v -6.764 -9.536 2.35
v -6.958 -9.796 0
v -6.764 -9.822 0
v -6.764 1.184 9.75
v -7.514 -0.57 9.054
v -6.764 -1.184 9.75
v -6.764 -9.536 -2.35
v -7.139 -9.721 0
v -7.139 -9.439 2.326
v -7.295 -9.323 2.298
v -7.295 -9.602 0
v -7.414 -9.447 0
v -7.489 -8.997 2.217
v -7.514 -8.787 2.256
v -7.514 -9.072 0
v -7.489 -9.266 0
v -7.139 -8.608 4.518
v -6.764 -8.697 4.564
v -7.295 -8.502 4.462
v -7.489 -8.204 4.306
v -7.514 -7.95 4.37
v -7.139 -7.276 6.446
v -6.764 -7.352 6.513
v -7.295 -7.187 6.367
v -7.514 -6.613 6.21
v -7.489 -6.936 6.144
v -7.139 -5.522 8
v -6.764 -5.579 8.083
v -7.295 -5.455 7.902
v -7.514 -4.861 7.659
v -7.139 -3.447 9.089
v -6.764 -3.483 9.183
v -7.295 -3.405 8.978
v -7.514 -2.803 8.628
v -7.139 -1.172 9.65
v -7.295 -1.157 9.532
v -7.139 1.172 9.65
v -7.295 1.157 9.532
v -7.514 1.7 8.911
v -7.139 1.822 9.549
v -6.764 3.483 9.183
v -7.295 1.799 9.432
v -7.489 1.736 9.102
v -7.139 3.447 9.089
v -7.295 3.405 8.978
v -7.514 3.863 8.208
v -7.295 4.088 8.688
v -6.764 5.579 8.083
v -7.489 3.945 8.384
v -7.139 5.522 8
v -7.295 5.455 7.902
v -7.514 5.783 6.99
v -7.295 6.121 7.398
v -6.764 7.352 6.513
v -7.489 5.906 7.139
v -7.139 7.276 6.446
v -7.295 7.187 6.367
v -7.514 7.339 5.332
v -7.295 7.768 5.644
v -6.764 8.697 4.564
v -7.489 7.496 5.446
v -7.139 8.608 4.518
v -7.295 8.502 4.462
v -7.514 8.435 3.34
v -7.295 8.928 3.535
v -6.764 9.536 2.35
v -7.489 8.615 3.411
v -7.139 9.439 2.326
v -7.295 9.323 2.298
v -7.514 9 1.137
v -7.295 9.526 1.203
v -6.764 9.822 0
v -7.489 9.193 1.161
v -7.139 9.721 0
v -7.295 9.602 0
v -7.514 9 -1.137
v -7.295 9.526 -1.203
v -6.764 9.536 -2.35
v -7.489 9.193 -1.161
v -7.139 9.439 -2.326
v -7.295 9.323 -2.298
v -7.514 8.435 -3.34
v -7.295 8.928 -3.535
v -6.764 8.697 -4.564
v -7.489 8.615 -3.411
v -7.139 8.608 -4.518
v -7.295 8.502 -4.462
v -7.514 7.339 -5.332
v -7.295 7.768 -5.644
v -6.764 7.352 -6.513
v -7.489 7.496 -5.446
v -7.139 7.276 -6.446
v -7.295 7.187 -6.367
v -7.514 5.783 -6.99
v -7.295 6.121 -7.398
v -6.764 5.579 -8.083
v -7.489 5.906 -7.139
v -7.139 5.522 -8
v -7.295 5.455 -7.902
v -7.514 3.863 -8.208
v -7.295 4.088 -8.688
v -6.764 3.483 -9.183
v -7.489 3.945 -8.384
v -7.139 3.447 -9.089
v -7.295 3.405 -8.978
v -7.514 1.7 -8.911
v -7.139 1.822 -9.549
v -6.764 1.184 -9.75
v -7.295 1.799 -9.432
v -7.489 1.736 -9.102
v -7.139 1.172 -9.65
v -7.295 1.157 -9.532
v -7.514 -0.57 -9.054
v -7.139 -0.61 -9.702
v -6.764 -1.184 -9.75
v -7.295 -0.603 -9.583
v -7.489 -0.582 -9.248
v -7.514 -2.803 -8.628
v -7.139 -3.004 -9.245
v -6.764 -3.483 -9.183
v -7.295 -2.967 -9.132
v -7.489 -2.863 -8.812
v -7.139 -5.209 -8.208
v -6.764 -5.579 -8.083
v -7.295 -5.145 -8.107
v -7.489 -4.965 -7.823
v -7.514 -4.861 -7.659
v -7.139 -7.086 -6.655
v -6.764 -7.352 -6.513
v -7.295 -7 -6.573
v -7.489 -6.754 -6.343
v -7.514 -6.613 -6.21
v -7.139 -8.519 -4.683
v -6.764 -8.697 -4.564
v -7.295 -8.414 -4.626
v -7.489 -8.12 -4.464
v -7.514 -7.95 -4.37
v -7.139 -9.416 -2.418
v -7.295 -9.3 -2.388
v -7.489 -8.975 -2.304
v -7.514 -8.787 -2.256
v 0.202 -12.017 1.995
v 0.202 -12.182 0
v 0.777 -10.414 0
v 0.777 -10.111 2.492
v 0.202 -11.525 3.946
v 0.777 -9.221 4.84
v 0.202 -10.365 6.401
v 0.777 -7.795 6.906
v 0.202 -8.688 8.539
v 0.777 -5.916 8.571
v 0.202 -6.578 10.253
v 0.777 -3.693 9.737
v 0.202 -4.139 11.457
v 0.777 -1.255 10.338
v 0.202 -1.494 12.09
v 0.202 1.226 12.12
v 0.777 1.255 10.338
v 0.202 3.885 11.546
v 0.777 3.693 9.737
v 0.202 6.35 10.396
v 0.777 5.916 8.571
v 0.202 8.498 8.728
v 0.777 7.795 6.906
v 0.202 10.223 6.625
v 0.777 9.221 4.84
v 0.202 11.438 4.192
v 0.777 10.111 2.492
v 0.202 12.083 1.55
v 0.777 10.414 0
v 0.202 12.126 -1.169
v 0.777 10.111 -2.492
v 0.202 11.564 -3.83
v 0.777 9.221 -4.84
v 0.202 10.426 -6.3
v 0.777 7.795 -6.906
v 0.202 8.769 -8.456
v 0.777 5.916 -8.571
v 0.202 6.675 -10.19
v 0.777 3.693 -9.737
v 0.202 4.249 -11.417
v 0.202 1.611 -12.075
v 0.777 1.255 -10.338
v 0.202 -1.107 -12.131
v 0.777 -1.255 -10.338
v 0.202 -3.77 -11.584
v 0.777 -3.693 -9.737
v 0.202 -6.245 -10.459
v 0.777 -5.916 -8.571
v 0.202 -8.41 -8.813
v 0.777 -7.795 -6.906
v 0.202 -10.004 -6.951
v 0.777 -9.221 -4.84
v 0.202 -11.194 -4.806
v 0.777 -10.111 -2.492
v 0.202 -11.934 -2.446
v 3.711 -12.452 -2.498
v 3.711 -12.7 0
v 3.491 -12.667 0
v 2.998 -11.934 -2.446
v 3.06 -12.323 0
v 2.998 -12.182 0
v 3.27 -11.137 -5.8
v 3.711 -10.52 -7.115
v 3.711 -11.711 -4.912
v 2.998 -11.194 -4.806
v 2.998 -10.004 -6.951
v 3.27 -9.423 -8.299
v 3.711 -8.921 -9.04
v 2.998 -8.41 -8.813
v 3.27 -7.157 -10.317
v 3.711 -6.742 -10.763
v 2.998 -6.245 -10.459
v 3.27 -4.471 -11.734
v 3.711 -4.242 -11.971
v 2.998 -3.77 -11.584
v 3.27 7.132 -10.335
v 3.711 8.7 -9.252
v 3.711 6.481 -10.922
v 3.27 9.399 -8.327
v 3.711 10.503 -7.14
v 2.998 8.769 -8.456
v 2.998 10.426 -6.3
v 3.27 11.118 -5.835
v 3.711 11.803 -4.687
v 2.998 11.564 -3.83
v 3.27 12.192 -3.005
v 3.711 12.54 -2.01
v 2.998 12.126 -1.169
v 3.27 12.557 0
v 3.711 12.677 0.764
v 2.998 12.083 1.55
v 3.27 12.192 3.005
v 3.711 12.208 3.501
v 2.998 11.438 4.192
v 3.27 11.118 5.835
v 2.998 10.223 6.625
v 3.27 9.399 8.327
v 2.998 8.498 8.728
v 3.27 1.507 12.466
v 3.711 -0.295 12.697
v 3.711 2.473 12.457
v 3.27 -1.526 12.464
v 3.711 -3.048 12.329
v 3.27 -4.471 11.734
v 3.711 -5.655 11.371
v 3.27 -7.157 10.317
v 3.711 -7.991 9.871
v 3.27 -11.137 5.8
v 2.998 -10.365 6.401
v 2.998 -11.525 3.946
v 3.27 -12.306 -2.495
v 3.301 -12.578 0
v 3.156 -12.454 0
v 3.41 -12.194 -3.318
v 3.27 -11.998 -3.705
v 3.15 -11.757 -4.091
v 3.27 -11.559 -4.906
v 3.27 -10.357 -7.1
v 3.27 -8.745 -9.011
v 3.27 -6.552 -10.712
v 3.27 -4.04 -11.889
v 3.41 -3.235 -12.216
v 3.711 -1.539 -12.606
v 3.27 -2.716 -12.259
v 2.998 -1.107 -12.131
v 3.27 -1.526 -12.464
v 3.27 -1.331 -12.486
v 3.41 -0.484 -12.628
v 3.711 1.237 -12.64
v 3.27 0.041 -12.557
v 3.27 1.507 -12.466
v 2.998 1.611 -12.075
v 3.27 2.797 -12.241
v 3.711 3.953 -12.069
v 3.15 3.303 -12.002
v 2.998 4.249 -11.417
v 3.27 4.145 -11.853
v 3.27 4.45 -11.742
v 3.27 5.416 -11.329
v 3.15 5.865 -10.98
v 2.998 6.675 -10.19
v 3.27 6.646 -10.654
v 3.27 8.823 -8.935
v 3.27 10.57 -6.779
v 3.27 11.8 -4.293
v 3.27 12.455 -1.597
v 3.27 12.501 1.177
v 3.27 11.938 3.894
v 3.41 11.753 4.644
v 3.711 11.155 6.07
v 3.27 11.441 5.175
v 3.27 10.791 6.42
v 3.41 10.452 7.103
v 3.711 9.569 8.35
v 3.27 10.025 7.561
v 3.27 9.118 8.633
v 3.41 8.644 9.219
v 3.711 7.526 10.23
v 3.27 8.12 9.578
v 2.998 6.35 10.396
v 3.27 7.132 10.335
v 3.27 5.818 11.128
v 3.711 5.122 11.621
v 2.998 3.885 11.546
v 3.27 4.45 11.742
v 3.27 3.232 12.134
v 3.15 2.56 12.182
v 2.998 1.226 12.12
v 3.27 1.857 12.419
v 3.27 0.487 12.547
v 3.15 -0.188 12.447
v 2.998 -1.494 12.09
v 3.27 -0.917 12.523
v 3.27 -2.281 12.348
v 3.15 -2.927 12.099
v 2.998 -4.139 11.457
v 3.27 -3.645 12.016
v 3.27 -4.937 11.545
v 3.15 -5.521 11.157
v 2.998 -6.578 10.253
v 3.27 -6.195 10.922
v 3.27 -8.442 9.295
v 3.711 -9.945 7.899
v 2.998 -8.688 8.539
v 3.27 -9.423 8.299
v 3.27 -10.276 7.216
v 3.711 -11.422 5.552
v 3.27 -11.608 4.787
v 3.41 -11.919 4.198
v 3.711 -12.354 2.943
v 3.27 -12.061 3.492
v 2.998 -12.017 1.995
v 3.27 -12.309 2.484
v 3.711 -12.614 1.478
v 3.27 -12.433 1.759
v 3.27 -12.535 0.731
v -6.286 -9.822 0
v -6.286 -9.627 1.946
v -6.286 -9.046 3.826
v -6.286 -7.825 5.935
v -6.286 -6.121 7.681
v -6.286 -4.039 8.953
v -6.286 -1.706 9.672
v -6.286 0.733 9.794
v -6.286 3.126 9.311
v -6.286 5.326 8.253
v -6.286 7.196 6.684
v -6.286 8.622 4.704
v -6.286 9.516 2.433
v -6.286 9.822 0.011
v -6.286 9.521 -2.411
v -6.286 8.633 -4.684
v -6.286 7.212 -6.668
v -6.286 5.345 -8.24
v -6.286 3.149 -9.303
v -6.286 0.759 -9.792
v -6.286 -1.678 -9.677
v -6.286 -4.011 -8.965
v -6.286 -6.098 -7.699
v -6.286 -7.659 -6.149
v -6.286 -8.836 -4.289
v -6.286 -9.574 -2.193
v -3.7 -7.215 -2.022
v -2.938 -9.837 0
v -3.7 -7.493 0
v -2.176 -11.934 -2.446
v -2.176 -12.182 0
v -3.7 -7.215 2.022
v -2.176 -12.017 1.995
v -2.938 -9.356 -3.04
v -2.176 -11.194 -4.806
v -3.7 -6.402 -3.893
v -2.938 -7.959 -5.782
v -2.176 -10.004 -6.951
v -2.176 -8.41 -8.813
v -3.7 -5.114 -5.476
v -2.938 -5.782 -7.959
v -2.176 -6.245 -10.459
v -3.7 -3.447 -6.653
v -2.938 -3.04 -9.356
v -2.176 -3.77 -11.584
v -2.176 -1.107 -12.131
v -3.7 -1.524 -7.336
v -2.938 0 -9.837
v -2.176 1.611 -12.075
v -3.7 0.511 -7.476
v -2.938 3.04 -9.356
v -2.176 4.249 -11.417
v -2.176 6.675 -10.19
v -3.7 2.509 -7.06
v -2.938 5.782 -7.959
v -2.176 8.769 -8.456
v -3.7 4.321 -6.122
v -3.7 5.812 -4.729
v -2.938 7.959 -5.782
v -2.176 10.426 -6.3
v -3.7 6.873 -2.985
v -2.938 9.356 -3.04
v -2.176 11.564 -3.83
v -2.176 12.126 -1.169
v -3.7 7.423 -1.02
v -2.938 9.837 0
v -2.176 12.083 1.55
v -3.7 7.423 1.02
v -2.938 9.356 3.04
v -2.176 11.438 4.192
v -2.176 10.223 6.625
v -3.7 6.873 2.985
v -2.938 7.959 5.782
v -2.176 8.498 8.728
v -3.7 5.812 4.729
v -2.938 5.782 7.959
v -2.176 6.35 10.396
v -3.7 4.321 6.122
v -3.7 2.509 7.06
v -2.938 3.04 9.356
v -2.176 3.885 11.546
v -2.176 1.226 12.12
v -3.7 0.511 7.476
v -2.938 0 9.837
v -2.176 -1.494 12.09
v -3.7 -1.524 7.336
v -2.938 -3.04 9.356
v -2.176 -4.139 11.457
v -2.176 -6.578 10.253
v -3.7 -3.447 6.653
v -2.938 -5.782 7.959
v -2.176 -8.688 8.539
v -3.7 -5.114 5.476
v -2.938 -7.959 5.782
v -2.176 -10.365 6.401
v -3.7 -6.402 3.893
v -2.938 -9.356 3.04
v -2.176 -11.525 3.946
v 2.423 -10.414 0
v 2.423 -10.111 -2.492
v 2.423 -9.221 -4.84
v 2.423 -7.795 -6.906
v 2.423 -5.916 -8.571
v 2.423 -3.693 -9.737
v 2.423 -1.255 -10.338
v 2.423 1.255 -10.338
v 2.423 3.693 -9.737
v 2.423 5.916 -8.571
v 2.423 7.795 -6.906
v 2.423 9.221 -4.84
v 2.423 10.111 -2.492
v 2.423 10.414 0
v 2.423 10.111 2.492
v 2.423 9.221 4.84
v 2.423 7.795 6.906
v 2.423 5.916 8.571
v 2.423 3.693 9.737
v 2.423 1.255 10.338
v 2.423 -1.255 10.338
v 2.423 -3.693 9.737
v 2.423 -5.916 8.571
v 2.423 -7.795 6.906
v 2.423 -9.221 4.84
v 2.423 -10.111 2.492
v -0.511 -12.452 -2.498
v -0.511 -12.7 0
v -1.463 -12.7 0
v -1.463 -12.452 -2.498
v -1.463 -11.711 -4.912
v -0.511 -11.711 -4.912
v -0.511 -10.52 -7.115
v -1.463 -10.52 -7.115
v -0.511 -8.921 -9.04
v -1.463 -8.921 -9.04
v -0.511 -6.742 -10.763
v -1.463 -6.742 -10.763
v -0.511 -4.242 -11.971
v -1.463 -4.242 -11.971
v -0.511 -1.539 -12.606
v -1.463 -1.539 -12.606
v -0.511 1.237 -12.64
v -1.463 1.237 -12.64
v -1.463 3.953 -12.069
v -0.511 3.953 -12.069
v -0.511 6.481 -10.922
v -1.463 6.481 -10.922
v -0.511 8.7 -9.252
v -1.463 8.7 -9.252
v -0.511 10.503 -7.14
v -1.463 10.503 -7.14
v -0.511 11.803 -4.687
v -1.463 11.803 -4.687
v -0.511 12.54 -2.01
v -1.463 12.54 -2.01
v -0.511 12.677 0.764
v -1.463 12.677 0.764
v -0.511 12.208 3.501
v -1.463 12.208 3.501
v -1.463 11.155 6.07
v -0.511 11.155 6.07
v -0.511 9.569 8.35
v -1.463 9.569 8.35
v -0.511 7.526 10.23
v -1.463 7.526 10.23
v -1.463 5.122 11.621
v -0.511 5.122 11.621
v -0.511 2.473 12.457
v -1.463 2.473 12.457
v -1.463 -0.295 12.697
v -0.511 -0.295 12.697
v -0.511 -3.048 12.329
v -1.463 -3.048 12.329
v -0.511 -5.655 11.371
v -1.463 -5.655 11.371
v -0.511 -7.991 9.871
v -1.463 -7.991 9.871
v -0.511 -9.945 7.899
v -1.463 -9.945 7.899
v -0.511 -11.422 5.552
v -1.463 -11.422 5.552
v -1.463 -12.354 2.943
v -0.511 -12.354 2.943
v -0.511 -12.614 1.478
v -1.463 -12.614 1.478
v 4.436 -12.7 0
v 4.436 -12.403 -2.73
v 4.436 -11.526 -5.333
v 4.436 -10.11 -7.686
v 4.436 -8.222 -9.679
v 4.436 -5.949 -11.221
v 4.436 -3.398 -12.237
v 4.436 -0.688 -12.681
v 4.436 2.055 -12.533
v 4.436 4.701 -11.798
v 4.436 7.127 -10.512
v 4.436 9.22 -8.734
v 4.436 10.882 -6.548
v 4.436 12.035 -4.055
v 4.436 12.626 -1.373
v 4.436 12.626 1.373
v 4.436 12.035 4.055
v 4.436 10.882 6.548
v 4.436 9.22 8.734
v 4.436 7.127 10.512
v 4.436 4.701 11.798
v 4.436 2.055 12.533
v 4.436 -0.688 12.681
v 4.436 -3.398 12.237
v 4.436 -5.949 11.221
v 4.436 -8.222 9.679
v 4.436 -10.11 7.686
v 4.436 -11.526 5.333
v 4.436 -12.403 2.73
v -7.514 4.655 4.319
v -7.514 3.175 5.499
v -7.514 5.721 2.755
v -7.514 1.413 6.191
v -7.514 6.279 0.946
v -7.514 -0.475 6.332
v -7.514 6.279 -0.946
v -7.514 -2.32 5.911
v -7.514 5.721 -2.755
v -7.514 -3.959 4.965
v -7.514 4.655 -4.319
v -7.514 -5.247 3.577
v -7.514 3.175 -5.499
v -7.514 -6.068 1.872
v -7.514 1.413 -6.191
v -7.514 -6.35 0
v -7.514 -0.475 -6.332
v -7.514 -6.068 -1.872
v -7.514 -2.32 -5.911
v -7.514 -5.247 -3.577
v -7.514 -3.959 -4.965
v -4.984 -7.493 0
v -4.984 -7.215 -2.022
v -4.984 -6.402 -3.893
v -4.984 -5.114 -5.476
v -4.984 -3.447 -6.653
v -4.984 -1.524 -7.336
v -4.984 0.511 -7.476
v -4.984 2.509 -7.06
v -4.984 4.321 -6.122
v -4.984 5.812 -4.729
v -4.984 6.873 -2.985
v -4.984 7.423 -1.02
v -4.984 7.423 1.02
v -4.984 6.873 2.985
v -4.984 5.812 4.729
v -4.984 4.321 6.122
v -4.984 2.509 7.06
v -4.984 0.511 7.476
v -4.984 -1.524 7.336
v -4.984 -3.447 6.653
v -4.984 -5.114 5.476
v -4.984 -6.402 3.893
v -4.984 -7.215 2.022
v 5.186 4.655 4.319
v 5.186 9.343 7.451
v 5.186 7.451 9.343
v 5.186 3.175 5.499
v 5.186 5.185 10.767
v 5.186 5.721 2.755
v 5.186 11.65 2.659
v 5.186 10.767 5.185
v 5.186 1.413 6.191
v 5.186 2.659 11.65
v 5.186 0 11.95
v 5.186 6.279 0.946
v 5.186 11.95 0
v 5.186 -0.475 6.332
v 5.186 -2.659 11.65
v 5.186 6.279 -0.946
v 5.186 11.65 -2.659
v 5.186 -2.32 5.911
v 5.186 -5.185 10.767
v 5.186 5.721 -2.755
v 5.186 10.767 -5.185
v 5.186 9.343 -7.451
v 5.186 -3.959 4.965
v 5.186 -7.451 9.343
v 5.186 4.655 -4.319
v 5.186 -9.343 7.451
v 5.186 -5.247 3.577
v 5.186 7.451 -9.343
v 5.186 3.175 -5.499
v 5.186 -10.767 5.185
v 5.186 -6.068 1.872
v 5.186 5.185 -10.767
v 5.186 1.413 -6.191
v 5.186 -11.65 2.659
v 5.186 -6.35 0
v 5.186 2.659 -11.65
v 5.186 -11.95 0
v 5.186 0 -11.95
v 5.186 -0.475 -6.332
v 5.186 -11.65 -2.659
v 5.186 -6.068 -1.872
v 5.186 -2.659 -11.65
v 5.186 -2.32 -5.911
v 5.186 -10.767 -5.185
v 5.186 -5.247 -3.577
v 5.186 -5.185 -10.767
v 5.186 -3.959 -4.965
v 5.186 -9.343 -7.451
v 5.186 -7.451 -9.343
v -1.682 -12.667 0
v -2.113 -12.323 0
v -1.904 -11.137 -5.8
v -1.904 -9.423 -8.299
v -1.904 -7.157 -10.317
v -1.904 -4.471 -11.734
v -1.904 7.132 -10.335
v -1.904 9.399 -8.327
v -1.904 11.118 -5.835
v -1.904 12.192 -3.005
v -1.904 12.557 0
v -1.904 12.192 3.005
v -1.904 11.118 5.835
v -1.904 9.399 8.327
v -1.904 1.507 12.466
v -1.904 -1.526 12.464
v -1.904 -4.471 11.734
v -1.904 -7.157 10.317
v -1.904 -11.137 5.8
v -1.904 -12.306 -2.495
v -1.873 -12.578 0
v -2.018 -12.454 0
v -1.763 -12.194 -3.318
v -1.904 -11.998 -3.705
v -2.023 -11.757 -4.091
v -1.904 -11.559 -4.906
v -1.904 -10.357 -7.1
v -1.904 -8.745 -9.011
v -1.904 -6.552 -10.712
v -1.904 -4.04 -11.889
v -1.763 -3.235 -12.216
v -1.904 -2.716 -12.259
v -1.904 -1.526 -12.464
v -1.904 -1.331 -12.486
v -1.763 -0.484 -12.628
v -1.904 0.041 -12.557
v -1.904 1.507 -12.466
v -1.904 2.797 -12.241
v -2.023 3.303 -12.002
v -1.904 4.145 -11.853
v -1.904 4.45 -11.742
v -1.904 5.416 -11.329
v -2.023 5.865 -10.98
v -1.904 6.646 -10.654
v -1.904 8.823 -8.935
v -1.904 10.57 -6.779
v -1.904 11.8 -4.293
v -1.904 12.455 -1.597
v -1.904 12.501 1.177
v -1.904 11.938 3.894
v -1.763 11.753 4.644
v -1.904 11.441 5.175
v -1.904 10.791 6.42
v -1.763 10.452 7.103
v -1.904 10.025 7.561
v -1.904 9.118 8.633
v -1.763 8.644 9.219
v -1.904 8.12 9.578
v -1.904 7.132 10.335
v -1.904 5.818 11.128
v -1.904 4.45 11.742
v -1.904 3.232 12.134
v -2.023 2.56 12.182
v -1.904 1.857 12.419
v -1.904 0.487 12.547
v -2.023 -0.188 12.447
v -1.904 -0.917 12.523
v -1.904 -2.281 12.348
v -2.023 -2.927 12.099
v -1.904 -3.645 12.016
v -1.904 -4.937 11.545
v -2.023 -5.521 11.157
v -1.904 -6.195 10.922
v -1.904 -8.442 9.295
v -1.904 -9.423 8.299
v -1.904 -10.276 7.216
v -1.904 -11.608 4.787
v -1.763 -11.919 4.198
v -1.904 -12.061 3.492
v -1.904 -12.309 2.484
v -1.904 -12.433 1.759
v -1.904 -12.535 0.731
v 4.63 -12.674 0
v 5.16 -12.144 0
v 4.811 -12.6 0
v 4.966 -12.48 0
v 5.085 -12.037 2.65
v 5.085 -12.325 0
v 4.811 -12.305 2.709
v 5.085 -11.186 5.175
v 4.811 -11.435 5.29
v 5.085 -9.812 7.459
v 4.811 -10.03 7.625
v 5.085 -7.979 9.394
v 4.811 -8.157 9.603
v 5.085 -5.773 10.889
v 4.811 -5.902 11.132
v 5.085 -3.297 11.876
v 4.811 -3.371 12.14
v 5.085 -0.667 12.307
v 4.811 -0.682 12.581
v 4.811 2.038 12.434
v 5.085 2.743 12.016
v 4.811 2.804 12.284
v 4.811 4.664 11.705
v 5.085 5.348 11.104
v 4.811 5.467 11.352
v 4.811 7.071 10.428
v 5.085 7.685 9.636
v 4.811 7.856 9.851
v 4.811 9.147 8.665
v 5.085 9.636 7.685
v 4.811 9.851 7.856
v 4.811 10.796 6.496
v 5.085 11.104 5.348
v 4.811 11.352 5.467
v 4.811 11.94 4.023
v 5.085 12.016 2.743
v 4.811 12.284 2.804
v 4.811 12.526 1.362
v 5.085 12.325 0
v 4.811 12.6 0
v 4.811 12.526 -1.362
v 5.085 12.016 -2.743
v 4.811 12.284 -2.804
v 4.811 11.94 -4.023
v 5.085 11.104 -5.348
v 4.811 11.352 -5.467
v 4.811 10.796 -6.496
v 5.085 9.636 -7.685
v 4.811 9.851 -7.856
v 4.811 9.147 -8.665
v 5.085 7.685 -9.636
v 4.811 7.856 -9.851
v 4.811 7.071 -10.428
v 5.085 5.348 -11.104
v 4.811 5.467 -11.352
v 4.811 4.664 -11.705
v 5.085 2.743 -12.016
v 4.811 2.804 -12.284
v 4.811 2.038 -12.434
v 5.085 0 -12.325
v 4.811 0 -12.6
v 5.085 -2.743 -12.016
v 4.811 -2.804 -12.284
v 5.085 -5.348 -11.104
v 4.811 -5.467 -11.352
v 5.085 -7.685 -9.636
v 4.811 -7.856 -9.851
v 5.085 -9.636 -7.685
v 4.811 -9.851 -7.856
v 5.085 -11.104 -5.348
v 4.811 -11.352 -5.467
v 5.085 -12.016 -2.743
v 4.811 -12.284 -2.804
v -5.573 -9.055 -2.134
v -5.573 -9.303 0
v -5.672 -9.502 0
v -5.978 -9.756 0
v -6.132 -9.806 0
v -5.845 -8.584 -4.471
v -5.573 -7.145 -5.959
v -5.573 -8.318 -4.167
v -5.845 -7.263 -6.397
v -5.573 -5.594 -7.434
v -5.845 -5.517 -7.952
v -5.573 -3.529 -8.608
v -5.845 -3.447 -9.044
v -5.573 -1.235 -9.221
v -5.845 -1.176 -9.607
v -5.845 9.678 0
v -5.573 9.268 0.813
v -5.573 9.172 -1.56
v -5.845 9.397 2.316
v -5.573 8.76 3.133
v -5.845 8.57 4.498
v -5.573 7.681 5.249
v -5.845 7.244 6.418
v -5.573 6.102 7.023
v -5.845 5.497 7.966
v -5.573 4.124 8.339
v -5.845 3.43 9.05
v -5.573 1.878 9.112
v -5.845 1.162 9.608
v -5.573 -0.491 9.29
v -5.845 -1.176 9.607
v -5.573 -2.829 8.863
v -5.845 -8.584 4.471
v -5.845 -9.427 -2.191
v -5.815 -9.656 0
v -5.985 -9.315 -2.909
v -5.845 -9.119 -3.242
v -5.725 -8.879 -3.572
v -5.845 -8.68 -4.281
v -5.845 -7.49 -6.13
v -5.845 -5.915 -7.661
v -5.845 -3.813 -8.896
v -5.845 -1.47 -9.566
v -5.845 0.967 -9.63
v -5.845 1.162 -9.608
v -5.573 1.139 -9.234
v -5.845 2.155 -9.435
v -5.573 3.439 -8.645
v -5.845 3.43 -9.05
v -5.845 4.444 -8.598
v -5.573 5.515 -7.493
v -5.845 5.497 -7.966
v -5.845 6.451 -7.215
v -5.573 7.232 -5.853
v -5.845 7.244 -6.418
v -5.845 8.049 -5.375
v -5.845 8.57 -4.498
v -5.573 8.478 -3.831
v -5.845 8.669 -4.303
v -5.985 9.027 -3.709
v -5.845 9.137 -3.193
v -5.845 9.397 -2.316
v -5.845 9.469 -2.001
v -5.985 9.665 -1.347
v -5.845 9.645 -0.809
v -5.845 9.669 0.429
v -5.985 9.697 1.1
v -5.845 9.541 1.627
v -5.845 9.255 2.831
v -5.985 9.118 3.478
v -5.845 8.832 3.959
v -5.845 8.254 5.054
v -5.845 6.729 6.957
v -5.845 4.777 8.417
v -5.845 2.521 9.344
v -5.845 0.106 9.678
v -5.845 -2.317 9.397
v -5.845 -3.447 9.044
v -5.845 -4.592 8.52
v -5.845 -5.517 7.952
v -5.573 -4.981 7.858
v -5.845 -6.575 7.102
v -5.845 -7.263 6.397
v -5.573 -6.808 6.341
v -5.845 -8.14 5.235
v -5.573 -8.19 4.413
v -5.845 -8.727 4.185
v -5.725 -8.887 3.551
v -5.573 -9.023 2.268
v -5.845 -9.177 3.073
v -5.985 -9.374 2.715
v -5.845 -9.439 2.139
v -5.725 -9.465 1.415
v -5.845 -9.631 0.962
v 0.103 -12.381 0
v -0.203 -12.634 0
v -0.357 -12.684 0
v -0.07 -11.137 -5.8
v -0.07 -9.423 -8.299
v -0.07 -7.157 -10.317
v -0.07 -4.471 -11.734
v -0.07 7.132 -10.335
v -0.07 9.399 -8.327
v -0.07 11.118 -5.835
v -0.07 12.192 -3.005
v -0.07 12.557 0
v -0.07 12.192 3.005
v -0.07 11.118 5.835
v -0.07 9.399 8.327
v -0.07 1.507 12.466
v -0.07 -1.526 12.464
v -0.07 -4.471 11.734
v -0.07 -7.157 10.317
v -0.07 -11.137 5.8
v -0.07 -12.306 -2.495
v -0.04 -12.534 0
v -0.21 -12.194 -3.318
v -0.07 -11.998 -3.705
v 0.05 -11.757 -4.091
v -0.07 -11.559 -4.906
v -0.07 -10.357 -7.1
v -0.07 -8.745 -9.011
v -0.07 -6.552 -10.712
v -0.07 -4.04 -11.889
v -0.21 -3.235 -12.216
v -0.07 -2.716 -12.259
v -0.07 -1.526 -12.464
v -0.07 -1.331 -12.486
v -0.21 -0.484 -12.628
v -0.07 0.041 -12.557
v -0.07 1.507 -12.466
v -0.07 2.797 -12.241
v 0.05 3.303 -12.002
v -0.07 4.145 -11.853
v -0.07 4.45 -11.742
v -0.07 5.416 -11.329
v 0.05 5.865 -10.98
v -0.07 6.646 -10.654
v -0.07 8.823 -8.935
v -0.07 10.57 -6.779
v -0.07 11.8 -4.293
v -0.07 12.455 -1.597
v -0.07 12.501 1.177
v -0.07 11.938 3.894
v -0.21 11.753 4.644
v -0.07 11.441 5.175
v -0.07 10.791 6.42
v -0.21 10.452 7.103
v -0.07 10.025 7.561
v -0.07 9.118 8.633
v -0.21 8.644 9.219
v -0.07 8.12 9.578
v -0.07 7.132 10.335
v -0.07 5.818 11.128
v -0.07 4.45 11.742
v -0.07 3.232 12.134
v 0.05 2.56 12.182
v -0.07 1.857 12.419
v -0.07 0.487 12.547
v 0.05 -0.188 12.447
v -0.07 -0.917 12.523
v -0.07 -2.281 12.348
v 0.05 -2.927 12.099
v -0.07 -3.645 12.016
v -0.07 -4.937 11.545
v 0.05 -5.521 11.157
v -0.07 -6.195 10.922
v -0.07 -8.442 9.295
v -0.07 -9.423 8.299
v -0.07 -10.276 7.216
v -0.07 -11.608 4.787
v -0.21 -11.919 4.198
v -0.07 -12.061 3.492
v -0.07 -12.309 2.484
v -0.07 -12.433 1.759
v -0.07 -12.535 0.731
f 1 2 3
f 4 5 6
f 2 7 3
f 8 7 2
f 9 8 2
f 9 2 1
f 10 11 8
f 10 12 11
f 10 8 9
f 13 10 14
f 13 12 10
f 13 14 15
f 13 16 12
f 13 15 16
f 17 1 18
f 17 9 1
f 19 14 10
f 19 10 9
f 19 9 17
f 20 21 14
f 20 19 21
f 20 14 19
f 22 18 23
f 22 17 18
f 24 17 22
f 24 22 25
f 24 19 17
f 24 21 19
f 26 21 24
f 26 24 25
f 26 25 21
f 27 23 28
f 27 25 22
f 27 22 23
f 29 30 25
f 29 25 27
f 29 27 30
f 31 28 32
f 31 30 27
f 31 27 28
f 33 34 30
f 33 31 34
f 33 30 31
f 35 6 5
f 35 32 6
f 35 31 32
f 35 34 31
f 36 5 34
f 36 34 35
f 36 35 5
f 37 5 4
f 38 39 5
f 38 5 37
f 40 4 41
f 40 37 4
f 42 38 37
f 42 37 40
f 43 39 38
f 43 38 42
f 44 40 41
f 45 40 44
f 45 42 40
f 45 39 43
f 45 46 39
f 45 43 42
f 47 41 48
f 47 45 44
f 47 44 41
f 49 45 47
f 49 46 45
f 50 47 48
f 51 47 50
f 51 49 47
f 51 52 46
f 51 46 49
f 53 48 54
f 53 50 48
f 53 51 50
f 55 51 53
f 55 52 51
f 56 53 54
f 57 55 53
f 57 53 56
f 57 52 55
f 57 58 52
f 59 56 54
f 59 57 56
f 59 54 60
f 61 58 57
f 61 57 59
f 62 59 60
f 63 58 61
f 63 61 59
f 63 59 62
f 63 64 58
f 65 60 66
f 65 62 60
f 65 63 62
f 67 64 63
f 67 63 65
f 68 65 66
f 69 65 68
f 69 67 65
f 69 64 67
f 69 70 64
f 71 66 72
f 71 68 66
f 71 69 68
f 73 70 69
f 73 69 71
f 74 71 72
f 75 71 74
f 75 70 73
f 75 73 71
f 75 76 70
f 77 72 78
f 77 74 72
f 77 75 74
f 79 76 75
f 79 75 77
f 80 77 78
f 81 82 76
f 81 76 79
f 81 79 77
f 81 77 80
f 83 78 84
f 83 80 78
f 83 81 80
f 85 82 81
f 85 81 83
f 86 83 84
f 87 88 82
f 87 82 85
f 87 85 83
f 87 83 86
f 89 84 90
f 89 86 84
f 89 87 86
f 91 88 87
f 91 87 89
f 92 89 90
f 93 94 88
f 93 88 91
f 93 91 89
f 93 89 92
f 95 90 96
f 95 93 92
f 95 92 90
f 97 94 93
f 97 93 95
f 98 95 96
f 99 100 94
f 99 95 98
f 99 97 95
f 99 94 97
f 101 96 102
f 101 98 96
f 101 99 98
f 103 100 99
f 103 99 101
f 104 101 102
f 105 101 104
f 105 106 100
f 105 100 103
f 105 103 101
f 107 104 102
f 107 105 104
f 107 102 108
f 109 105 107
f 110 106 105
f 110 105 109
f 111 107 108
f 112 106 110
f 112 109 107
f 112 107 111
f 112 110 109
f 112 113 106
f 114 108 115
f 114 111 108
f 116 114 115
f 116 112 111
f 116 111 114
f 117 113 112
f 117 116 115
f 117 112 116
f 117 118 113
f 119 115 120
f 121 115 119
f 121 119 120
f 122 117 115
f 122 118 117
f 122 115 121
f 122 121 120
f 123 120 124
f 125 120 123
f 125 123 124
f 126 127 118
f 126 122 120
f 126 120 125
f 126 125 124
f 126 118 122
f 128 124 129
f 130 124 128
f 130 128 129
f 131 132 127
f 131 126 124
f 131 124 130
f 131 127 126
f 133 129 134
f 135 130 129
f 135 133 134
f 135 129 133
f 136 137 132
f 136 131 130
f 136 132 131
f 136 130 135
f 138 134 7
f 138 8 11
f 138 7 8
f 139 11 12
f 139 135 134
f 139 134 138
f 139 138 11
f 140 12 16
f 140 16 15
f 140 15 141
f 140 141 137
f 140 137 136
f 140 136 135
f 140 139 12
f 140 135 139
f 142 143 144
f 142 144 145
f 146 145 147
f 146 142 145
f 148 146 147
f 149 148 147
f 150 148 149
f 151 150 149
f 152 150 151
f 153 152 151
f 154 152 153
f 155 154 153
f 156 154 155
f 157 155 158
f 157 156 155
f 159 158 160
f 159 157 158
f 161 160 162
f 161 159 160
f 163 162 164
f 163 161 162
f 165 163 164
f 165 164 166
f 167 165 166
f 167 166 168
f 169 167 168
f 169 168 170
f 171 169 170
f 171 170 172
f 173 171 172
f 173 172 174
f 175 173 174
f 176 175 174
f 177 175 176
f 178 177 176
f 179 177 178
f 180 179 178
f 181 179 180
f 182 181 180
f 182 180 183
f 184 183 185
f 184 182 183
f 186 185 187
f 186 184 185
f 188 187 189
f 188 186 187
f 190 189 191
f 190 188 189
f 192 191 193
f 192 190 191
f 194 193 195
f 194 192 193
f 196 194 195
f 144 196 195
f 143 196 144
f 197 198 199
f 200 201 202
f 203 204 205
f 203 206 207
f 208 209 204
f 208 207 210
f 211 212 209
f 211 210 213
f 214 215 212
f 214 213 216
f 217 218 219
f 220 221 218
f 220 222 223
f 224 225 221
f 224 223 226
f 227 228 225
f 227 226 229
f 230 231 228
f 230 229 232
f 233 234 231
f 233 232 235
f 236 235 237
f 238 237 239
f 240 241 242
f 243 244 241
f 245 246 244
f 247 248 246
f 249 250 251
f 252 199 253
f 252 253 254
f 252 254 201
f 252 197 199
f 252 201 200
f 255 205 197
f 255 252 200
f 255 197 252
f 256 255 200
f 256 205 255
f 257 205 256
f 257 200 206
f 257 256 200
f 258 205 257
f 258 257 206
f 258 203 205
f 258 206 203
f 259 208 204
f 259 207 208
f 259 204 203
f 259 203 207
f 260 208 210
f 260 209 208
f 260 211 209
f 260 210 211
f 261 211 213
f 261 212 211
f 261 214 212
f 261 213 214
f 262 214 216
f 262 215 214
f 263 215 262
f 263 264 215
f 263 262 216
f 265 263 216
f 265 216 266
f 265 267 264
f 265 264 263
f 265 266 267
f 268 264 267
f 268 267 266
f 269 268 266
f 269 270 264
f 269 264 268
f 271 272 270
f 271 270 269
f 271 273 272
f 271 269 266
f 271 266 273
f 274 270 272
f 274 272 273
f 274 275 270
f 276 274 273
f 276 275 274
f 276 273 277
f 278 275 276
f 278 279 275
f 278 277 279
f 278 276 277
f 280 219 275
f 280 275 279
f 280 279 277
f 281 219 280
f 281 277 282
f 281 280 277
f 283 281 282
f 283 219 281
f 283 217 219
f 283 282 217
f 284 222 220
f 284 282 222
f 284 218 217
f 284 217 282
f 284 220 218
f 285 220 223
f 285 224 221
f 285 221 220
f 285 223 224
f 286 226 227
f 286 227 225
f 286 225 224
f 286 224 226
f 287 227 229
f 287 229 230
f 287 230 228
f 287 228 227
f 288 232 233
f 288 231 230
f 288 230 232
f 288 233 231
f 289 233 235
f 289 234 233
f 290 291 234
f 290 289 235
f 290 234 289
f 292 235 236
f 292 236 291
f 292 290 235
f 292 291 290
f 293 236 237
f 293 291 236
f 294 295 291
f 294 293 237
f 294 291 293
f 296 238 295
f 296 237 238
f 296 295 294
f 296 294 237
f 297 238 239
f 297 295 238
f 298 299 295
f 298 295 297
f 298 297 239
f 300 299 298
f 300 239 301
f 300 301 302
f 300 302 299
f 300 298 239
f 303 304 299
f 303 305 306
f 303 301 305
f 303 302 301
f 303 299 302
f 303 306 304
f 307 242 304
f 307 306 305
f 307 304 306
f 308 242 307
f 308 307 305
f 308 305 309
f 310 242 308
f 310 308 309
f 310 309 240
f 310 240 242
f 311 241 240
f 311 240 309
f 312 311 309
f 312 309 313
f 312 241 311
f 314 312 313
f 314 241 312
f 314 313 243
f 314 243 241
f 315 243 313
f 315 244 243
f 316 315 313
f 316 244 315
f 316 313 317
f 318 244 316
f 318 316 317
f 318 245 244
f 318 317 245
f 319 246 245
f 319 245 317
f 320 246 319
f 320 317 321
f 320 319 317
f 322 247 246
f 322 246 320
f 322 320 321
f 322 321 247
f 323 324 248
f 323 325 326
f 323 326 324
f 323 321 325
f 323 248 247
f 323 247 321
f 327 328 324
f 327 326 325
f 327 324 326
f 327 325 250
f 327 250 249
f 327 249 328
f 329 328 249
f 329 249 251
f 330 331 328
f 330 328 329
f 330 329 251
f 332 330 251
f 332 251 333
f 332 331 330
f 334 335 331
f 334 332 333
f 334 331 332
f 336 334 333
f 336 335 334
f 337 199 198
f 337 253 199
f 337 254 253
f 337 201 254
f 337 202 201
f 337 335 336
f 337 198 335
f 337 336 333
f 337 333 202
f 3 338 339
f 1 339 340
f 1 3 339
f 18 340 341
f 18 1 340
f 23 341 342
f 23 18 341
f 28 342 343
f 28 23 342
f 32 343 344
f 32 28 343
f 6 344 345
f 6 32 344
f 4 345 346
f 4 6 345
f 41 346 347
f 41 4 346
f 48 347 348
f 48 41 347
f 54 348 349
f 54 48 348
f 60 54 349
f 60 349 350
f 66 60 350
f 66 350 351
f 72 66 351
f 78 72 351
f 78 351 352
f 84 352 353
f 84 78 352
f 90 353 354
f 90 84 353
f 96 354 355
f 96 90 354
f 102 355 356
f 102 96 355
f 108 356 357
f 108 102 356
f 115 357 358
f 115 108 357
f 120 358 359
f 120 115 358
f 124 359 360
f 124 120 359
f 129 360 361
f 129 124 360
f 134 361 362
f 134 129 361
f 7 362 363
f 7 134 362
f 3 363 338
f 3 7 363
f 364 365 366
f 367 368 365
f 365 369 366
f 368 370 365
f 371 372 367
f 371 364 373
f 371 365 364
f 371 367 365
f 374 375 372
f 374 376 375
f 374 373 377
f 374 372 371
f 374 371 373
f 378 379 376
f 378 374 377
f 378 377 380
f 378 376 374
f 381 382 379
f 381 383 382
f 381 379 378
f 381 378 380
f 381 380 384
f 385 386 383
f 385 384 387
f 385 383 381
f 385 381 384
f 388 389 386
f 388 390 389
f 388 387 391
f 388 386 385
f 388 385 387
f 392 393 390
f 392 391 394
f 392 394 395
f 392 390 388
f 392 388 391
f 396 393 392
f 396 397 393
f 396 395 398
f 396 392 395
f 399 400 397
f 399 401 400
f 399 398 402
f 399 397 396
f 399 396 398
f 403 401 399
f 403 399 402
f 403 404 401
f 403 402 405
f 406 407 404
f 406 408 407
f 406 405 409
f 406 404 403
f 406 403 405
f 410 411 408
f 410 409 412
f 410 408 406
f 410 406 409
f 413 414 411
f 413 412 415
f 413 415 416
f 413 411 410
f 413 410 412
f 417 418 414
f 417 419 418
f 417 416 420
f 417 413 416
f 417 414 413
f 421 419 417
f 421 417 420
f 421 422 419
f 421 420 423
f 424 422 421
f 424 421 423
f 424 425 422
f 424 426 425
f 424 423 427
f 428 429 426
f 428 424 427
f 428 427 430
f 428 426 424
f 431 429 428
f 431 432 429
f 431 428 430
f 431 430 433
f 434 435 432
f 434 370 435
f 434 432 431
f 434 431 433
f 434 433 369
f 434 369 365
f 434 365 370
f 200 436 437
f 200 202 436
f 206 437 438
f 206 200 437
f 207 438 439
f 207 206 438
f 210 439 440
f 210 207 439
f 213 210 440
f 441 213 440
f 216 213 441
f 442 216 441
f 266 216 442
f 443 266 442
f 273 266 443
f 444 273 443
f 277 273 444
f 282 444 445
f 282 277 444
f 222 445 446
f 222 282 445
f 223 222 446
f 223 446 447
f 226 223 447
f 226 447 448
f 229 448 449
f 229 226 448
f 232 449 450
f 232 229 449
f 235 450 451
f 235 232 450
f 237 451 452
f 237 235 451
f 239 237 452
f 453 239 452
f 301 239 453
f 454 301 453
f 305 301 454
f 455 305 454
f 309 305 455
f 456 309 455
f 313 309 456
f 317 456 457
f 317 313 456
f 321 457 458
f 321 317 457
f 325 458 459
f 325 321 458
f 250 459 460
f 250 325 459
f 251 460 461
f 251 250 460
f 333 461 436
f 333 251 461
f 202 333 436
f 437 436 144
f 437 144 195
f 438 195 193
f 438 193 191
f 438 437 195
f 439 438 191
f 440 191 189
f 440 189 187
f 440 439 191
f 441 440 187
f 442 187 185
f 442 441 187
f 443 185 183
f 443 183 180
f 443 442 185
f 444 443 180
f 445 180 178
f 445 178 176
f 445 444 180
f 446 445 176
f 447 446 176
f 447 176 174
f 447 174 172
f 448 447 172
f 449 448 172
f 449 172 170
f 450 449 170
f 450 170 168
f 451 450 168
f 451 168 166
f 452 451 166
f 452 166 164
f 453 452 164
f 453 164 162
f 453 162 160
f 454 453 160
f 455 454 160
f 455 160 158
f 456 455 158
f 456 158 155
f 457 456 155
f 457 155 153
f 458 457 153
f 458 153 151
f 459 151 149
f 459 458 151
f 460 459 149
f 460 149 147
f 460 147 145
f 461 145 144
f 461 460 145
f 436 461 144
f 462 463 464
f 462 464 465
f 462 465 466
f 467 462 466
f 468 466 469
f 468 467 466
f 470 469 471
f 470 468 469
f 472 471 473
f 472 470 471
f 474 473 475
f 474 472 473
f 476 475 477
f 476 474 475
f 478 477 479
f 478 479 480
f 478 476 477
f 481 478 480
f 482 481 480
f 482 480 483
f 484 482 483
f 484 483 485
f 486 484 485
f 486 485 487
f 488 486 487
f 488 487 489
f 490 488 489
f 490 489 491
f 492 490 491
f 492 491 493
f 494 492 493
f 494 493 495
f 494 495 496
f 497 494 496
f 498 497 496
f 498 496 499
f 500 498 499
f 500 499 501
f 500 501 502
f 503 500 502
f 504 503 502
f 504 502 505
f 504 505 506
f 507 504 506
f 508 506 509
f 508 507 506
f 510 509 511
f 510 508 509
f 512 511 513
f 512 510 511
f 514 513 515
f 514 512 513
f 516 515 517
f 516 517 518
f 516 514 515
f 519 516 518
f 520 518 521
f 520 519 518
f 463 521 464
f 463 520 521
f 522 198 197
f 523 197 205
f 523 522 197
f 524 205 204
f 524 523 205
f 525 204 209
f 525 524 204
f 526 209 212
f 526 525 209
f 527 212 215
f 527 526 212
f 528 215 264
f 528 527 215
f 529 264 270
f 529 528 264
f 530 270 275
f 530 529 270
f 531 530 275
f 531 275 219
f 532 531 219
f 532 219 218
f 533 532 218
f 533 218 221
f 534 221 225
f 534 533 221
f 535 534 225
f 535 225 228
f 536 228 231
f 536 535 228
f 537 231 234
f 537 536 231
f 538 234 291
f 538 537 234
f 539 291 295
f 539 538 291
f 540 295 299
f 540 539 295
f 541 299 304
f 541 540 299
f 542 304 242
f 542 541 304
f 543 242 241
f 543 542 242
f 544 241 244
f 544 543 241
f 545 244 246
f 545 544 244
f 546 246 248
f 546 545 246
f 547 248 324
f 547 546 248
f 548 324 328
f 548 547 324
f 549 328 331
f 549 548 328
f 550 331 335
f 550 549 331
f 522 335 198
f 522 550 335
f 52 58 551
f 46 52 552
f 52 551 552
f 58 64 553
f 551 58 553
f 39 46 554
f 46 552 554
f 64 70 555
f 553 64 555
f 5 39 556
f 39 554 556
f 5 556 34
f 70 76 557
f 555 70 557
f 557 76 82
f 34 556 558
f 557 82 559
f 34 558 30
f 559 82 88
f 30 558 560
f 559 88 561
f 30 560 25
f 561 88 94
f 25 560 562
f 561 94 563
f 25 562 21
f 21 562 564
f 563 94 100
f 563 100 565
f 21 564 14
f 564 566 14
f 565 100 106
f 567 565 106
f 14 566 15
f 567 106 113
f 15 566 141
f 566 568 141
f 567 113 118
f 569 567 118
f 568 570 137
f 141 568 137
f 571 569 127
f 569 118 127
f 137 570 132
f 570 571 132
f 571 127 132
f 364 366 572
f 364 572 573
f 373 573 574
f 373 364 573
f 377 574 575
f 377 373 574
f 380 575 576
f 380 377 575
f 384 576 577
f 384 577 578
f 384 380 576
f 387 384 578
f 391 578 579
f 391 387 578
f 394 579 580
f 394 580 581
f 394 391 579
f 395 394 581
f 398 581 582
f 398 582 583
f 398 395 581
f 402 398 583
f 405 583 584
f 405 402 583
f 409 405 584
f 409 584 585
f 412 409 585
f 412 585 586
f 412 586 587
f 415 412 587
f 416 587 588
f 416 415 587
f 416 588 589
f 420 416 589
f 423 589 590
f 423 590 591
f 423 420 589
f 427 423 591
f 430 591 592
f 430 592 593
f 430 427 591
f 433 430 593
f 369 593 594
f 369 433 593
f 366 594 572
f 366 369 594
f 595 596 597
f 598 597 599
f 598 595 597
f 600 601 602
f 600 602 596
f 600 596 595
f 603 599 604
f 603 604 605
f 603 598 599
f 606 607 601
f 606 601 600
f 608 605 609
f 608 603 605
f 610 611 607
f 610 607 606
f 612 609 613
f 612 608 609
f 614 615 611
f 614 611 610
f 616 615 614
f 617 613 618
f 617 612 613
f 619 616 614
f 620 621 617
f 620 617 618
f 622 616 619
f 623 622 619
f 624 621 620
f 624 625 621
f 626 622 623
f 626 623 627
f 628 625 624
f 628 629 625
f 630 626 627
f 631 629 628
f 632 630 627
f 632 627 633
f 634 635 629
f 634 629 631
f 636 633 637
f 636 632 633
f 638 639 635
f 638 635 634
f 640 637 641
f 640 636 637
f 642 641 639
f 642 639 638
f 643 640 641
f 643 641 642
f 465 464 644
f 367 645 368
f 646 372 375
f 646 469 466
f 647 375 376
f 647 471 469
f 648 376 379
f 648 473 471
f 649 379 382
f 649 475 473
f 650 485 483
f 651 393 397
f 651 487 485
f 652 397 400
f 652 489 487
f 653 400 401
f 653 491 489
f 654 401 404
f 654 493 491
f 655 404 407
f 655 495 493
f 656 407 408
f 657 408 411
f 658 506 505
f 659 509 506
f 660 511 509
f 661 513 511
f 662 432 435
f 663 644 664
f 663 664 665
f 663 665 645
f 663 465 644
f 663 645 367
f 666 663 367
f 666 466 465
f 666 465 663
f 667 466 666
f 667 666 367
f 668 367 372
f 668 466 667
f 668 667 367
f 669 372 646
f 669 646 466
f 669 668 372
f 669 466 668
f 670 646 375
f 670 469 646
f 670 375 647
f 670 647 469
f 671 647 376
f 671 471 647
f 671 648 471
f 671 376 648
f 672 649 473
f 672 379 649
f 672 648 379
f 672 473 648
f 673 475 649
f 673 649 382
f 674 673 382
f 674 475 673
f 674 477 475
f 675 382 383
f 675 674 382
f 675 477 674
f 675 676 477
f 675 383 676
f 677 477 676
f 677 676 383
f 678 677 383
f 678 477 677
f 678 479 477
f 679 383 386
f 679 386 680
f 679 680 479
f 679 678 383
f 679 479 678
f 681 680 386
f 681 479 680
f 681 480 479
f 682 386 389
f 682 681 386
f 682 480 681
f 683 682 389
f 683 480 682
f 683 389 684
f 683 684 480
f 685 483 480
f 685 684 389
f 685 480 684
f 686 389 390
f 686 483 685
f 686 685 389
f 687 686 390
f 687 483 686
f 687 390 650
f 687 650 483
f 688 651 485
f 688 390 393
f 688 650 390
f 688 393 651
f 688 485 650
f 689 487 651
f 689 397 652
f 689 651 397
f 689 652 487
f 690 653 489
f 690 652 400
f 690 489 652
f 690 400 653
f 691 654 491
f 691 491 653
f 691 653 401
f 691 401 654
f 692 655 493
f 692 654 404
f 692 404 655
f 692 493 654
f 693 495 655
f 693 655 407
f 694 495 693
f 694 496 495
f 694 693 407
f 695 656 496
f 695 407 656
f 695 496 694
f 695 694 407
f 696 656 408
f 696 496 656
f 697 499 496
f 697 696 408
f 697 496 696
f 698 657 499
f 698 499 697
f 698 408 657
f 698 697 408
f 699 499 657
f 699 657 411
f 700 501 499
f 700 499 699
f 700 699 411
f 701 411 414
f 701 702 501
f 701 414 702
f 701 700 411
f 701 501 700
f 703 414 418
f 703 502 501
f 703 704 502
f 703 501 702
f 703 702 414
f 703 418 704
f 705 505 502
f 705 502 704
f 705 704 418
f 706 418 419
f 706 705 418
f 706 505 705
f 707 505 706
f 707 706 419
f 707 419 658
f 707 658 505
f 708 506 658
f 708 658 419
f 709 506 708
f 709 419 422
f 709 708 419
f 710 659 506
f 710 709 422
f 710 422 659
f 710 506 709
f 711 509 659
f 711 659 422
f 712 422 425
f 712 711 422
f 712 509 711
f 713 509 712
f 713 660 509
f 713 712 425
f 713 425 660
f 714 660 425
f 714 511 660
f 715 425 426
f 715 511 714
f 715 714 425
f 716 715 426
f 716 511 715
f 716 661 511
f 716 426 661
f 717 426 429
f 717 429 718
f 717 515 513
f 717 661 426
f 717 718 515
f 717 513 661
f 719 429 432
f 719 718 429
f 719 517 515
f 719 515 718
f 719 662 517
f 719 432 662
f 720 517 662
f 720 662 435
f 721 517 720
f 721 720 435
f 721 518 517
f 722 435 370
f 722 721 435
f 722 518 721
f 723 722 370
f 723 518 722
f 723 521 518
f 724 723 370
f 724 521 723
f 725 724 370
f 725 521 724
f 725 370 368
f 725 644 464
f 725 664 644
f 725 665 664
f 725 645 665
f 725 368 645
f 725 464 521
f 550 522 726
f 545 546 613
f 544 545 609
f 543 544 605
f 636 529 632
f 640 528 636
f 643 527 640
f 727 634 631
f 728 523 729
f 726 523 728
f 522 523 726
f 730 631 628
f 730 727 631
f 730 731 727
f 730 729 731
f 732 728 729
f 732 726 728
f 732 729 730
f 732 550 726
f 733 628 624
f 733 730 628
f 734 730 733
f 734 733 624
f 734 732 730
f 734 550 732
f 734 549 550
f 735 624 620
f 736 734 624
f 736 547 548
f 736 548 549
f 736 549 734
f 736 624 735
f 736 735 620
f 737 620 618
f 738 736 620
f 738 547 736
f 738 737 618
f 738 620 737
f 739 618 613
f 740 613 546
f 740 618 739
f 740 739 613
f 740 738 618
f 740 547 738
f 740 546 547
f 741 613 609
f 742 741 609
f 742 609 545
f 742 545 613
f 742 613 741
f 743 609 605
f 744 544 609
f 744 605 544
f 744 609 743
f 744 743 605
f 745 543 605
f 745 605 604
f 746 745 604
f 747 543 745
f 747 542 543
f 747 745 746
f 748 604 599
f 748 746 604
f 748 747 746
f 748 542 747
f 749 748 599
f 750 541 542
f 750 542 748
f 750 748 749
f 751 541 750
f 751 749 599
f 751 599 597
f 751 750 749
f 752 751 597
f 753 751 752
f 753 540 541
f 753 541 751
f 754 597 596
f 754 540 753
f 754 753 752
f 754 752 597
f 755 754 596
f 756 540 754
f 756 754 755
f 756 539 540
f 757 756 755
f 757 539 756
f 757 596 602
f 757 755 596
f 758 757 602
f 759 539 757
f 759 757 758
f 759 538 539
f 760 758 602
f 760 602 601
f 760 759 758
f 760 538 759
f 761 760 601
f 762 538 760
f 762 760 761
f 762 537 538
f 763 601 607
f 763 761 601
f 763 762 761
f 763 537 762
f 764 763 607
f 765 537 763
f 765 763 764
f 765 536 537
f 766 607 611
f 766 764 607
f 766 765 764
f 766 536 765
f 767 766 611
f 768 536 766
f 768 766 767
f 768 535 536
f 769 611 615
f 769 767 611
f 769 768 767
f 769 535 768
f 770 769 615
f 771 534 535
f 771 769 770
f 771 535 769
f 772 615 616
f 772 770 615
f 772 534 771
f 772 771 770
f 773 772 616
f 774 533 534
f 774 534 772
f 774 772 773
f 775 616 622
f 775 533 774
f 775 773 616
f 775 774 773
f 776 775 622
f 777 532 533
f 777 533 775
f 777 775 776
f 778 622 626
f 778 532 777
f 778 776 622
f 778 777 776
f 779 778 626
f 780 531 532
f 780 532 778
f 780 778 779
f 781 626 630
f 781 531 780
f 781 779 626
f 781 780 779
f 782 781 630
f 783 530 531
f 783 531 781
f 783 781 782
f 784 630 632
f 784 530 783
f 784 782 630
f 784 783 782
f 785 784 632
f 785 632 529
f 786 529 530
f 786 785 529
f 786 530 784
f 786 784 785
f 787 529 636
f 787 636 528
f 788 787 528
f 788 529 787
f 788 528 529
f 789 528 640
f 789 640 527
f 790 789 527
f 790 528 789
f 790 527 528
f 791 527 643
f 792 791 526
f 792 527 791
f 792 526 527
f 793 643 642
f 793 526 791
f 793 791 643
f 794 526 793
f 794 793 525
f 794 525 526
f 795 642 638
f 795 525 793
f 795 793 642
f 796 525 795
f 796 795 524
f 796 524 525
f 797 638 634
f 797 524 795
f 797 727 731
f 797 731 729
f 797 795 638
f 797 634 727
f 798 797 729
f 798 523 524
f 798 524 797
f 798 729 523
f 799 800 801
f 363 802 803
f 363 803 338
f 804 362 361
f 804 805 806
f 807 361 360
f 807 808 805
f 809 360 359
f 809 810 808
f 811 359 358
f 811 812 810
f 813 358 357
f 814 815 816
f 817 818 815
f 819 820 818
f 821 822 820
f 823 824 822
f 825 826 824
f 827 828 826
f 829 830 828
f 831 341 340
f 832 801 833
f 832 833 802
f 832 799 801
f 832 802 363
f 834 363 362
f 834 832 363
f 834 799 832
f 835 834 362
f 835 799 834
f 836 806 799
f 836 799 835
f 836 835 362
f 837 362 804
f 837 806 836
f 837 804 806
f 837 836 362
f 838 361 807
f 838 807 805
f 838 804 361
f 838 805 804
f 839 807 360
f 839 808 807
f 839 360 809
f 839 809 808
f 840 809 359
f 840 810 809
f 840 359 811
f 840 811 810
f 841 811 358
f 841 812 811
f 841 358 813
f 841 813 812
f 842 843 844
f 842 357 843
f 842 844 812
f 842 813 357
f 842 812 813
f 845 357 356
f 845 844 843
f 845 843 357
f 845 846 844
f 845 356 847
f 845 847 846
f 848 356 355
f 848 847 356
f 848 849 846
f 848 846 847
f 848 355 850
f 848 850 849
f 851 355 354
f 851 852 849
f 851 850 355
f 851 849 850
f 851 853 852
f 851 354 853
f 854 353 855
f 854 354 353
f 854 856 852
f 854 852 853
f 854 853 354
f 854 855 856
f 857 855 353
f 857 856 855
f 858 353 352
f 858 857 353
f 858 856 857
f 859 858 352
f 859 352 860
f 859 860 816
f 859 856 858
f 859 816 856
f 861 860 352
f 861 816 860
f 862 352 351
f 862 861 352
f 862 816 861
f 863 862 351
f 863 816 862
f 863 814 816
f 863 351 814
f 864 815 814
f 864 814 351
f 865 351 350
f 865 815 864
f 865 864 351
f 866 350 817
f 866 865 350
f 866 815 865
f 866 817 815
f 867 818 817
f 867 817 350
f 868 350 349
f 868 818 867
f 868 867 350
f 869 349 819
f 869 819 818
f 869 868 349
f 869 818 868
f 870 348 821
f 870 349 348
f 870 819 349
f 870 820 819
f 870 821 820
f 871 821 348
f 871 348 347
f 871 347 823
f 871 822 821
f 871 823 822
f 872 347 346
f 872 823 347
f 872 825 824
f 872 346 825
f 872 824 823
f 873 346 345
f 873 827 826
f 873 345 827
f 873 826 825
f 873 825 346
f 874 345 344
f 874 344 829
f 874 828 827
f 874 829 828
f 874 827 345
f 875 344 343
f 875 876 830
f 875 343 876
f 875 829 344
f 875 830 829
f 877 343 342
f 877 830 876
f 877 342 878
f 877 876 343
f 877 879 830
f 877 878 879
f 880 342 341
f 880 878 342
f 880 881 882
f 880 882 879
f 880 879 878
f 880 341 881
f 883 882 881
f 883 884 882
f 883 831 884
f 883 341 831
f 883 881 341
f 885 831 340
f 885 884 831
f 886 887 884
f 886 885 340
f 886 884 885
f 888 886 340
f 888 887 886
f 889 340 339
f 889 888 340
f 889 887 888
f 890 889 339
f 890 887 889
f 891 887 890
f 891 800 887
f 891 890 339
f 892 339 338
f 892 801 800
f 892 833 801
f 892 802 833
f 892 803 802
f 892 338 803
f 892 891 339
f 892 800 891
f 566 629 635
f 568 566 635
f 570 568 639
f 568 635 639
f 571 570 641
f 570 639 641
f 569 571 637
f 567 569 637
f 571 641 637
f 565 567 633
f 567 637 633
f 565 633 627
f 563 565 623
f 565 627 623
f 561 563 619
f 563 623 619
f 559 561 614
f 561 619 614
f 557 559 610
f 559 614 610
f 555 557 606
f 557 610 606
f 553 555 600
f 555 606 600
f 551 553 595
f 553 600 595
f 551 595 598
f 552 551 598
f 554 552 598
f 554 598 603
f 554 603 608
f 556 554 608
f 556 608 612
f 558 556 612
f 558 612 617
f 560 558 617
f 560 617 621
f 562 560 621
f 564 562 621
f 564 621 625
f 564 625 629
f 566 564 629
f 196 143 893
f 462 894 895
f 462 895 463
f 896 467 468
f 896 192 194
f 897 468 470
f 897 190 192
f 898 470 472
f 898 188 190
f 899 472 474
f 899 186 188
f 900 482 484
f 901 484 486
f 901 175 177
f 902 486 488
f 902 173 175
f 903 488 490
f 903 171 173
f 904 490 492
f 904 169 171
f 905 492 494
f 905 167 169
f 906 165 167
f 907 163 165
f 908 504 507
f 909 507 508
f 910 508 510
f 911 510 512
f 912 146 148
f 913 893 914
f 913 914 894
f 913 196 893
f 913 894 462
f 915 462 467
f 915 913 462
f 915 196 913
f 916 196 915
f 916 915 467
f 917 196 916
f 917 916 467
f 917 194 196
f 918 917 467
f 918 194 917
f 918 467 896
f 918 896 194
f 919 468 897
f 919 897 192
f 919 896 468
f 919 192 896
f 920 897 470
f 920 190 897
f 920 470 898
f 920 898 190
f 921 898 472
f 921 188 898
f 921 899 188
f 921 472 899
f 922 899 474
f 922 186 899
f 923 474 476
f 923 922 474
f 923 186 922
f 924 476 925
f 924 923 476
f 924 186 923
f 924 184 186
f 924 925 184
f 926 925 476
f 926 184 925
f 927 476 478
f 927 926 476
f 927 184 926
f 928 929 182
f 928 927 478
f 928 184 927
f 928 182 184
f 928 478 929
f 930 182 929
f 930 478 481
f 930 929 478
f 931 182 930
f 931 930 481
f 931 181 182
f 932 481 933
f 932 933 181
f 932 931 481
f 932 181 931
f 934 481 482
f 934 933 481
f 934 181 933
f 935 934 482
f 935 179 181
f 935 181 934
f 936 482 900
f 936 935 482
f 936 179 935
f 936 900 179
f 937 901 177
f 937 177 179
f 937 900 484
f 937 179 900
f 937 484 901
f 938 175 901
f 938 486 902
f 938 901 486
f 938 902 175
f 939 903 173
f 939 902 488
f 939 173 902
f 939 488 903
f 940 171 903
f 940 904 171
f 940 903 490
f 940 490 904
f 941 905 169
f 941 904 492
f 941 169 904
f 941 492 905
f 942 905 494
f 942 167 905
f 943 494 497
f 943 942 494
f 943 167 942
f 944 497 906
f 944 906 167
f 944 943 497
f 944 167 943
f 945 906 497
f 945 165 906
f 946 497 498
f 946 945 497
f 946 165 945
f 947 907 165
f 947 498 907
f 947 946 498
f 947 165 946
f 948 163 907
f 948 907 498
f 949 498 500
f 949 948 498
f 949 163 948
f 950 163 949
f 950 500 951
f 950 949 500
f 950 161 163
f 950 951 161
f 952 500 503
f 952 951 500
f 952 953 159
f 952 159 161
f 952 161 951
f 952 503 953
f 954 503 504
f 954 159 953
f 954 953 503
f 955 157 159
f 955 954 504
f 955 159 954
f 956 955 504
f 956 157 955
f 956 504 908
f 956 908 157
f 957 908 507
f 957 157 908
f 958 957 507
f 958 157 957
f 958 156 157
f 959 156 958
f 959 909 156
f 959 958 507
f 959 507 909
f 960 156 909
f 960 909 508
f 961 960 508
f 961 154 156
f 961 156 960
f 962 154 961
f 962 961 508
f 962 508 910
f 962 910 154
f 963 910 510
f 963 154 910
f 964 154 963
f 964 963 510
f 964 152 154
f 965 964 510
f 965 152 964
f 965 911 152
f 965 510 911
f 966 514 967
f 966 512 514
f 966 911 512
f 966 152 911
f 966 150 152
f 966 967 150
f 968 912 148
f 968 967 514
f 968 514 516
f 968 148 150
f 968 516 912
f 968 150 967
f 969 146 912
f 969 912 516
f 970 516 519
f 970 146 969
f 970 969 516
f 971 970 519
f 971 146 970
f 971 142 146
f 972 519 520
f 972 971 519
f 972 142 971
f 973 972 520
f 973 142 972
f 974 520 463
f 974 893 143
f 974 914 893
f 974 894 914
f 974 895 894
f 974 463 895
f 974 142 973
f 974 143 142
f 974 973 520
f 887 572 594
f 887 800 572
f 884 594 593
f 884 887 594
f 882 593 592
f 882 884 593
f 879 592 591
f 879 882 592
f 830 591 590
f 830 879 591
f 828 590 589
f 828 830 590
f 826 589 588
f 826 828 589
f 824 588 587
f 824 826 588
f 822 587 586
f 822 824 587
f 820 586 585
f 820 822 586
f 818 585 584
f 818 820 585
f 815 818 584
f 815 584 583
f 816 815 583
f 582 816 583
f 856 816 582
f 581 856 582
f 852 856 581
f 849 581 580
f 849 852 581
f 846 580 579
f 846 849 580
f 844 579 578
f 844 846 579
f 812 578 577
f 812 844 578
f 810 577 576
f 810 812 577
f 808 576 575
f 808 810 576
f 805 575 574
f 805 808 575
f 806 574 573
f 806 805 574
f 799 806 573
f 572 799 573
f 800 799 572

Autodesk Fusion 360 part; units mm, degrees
sketch "Sketch2" plane through (0, 0, 0) normal (0, 0, 1) x (1, 0, 0)
  line L0 (-4.9843, -7.493) -> (-5.7409, -9.8217)
  line L1 (-4.9843, -7.493) -> (-3.6995, -7.493)
  line L2 (-3.6995, -7.493) -> (-2.0076, -12.7)
  line L3 (0.7769, -10.414) -> (0.0341, -12.7)
  line L4 (0.7769, -10.414) -> (2.4231, -10.414)
  line L5 (2.4231, -10.414) -> (3.1659, -12.7)
  circle A0 centre (1.6, -12.2784) radius 1.359 construction
  line L6 (3.1659, -12.7) -> (5.1858, -12.7)
  line L7 (-2.0076, -12.7) -> (0.0341, -12.7)
  circle A1 centre (-4.3419, -8.7519) radius 1 construction
  line L8 (-7.5142, -9.8217) -> (-7.5142, -6.35)
  line L9 (-7.5142, 0) -> (5, 0)
  line L10 (-7.5142, -6.35) -> (5.1858, -6.35)
  line L11 (5.1858, -12.7) -> (5.1858, -6.35)
  line L12 (-5.7409, -9.8217) -> (-7.5142, -9.8217)
  dimension "d142_1_1_1" = 12.7
  dimension "d145_1_1_1" = 108
  dimension "d146_1_1_1" = 108
  dimension "d147_1_1_1" = 1.6
  dimension "d150_1_1_1" = 10.414
  dimension "d152_1_1_1" = 12.2784
  dimension "d158_1_1_1" = 12.7
  dimension "d159_1_1_1" = 6.35
  dimension "d161_1_1_1" = 108
  dimension "d162_1_1_1" = 7.493
  dimension "d165_1_1_1" = 108
  dimension "d166_1_1_1" = 2
  dimension "d167_1_1_1" = 7.5142
  dimension "d169_1_1_1" = 9.8217
  dimension "d64_1_1" = 1.6462
  dimension "d65_1_1" = 2.5299
  dimension "d66_1_1" = 2.0418
revolve "Revolve2" add sketch "Sketch2" angle 360 about axis through (-7.5142, 0, 0) along (1, 0, 0)
fillet "Fillet1" radius 0.75 6 edges at (-7.5142, -3.5517, -9.1571) (-5.7409, -3.5517, -9.1571) (-2.0076, -4.5925, -11.8406) (0.0341, -4.5925, -11.8406) (3.1659, -4.5925, -11.8406) (5.1858, -4.5925, -11.8406)
equation "d116_1 = 0.0000 in"
equation "d117_1 = 0.0000 in"
equation "d118_1 = 0.0000 in"
equation "d119_1 = 0.000 deg"
equation "d128_1 = 0.0000 in"
equation "d129_1 = 0.0000 in"
equation "d130_1 = 0.0000 in"
equation "d131_1 = 0.000 deg"
